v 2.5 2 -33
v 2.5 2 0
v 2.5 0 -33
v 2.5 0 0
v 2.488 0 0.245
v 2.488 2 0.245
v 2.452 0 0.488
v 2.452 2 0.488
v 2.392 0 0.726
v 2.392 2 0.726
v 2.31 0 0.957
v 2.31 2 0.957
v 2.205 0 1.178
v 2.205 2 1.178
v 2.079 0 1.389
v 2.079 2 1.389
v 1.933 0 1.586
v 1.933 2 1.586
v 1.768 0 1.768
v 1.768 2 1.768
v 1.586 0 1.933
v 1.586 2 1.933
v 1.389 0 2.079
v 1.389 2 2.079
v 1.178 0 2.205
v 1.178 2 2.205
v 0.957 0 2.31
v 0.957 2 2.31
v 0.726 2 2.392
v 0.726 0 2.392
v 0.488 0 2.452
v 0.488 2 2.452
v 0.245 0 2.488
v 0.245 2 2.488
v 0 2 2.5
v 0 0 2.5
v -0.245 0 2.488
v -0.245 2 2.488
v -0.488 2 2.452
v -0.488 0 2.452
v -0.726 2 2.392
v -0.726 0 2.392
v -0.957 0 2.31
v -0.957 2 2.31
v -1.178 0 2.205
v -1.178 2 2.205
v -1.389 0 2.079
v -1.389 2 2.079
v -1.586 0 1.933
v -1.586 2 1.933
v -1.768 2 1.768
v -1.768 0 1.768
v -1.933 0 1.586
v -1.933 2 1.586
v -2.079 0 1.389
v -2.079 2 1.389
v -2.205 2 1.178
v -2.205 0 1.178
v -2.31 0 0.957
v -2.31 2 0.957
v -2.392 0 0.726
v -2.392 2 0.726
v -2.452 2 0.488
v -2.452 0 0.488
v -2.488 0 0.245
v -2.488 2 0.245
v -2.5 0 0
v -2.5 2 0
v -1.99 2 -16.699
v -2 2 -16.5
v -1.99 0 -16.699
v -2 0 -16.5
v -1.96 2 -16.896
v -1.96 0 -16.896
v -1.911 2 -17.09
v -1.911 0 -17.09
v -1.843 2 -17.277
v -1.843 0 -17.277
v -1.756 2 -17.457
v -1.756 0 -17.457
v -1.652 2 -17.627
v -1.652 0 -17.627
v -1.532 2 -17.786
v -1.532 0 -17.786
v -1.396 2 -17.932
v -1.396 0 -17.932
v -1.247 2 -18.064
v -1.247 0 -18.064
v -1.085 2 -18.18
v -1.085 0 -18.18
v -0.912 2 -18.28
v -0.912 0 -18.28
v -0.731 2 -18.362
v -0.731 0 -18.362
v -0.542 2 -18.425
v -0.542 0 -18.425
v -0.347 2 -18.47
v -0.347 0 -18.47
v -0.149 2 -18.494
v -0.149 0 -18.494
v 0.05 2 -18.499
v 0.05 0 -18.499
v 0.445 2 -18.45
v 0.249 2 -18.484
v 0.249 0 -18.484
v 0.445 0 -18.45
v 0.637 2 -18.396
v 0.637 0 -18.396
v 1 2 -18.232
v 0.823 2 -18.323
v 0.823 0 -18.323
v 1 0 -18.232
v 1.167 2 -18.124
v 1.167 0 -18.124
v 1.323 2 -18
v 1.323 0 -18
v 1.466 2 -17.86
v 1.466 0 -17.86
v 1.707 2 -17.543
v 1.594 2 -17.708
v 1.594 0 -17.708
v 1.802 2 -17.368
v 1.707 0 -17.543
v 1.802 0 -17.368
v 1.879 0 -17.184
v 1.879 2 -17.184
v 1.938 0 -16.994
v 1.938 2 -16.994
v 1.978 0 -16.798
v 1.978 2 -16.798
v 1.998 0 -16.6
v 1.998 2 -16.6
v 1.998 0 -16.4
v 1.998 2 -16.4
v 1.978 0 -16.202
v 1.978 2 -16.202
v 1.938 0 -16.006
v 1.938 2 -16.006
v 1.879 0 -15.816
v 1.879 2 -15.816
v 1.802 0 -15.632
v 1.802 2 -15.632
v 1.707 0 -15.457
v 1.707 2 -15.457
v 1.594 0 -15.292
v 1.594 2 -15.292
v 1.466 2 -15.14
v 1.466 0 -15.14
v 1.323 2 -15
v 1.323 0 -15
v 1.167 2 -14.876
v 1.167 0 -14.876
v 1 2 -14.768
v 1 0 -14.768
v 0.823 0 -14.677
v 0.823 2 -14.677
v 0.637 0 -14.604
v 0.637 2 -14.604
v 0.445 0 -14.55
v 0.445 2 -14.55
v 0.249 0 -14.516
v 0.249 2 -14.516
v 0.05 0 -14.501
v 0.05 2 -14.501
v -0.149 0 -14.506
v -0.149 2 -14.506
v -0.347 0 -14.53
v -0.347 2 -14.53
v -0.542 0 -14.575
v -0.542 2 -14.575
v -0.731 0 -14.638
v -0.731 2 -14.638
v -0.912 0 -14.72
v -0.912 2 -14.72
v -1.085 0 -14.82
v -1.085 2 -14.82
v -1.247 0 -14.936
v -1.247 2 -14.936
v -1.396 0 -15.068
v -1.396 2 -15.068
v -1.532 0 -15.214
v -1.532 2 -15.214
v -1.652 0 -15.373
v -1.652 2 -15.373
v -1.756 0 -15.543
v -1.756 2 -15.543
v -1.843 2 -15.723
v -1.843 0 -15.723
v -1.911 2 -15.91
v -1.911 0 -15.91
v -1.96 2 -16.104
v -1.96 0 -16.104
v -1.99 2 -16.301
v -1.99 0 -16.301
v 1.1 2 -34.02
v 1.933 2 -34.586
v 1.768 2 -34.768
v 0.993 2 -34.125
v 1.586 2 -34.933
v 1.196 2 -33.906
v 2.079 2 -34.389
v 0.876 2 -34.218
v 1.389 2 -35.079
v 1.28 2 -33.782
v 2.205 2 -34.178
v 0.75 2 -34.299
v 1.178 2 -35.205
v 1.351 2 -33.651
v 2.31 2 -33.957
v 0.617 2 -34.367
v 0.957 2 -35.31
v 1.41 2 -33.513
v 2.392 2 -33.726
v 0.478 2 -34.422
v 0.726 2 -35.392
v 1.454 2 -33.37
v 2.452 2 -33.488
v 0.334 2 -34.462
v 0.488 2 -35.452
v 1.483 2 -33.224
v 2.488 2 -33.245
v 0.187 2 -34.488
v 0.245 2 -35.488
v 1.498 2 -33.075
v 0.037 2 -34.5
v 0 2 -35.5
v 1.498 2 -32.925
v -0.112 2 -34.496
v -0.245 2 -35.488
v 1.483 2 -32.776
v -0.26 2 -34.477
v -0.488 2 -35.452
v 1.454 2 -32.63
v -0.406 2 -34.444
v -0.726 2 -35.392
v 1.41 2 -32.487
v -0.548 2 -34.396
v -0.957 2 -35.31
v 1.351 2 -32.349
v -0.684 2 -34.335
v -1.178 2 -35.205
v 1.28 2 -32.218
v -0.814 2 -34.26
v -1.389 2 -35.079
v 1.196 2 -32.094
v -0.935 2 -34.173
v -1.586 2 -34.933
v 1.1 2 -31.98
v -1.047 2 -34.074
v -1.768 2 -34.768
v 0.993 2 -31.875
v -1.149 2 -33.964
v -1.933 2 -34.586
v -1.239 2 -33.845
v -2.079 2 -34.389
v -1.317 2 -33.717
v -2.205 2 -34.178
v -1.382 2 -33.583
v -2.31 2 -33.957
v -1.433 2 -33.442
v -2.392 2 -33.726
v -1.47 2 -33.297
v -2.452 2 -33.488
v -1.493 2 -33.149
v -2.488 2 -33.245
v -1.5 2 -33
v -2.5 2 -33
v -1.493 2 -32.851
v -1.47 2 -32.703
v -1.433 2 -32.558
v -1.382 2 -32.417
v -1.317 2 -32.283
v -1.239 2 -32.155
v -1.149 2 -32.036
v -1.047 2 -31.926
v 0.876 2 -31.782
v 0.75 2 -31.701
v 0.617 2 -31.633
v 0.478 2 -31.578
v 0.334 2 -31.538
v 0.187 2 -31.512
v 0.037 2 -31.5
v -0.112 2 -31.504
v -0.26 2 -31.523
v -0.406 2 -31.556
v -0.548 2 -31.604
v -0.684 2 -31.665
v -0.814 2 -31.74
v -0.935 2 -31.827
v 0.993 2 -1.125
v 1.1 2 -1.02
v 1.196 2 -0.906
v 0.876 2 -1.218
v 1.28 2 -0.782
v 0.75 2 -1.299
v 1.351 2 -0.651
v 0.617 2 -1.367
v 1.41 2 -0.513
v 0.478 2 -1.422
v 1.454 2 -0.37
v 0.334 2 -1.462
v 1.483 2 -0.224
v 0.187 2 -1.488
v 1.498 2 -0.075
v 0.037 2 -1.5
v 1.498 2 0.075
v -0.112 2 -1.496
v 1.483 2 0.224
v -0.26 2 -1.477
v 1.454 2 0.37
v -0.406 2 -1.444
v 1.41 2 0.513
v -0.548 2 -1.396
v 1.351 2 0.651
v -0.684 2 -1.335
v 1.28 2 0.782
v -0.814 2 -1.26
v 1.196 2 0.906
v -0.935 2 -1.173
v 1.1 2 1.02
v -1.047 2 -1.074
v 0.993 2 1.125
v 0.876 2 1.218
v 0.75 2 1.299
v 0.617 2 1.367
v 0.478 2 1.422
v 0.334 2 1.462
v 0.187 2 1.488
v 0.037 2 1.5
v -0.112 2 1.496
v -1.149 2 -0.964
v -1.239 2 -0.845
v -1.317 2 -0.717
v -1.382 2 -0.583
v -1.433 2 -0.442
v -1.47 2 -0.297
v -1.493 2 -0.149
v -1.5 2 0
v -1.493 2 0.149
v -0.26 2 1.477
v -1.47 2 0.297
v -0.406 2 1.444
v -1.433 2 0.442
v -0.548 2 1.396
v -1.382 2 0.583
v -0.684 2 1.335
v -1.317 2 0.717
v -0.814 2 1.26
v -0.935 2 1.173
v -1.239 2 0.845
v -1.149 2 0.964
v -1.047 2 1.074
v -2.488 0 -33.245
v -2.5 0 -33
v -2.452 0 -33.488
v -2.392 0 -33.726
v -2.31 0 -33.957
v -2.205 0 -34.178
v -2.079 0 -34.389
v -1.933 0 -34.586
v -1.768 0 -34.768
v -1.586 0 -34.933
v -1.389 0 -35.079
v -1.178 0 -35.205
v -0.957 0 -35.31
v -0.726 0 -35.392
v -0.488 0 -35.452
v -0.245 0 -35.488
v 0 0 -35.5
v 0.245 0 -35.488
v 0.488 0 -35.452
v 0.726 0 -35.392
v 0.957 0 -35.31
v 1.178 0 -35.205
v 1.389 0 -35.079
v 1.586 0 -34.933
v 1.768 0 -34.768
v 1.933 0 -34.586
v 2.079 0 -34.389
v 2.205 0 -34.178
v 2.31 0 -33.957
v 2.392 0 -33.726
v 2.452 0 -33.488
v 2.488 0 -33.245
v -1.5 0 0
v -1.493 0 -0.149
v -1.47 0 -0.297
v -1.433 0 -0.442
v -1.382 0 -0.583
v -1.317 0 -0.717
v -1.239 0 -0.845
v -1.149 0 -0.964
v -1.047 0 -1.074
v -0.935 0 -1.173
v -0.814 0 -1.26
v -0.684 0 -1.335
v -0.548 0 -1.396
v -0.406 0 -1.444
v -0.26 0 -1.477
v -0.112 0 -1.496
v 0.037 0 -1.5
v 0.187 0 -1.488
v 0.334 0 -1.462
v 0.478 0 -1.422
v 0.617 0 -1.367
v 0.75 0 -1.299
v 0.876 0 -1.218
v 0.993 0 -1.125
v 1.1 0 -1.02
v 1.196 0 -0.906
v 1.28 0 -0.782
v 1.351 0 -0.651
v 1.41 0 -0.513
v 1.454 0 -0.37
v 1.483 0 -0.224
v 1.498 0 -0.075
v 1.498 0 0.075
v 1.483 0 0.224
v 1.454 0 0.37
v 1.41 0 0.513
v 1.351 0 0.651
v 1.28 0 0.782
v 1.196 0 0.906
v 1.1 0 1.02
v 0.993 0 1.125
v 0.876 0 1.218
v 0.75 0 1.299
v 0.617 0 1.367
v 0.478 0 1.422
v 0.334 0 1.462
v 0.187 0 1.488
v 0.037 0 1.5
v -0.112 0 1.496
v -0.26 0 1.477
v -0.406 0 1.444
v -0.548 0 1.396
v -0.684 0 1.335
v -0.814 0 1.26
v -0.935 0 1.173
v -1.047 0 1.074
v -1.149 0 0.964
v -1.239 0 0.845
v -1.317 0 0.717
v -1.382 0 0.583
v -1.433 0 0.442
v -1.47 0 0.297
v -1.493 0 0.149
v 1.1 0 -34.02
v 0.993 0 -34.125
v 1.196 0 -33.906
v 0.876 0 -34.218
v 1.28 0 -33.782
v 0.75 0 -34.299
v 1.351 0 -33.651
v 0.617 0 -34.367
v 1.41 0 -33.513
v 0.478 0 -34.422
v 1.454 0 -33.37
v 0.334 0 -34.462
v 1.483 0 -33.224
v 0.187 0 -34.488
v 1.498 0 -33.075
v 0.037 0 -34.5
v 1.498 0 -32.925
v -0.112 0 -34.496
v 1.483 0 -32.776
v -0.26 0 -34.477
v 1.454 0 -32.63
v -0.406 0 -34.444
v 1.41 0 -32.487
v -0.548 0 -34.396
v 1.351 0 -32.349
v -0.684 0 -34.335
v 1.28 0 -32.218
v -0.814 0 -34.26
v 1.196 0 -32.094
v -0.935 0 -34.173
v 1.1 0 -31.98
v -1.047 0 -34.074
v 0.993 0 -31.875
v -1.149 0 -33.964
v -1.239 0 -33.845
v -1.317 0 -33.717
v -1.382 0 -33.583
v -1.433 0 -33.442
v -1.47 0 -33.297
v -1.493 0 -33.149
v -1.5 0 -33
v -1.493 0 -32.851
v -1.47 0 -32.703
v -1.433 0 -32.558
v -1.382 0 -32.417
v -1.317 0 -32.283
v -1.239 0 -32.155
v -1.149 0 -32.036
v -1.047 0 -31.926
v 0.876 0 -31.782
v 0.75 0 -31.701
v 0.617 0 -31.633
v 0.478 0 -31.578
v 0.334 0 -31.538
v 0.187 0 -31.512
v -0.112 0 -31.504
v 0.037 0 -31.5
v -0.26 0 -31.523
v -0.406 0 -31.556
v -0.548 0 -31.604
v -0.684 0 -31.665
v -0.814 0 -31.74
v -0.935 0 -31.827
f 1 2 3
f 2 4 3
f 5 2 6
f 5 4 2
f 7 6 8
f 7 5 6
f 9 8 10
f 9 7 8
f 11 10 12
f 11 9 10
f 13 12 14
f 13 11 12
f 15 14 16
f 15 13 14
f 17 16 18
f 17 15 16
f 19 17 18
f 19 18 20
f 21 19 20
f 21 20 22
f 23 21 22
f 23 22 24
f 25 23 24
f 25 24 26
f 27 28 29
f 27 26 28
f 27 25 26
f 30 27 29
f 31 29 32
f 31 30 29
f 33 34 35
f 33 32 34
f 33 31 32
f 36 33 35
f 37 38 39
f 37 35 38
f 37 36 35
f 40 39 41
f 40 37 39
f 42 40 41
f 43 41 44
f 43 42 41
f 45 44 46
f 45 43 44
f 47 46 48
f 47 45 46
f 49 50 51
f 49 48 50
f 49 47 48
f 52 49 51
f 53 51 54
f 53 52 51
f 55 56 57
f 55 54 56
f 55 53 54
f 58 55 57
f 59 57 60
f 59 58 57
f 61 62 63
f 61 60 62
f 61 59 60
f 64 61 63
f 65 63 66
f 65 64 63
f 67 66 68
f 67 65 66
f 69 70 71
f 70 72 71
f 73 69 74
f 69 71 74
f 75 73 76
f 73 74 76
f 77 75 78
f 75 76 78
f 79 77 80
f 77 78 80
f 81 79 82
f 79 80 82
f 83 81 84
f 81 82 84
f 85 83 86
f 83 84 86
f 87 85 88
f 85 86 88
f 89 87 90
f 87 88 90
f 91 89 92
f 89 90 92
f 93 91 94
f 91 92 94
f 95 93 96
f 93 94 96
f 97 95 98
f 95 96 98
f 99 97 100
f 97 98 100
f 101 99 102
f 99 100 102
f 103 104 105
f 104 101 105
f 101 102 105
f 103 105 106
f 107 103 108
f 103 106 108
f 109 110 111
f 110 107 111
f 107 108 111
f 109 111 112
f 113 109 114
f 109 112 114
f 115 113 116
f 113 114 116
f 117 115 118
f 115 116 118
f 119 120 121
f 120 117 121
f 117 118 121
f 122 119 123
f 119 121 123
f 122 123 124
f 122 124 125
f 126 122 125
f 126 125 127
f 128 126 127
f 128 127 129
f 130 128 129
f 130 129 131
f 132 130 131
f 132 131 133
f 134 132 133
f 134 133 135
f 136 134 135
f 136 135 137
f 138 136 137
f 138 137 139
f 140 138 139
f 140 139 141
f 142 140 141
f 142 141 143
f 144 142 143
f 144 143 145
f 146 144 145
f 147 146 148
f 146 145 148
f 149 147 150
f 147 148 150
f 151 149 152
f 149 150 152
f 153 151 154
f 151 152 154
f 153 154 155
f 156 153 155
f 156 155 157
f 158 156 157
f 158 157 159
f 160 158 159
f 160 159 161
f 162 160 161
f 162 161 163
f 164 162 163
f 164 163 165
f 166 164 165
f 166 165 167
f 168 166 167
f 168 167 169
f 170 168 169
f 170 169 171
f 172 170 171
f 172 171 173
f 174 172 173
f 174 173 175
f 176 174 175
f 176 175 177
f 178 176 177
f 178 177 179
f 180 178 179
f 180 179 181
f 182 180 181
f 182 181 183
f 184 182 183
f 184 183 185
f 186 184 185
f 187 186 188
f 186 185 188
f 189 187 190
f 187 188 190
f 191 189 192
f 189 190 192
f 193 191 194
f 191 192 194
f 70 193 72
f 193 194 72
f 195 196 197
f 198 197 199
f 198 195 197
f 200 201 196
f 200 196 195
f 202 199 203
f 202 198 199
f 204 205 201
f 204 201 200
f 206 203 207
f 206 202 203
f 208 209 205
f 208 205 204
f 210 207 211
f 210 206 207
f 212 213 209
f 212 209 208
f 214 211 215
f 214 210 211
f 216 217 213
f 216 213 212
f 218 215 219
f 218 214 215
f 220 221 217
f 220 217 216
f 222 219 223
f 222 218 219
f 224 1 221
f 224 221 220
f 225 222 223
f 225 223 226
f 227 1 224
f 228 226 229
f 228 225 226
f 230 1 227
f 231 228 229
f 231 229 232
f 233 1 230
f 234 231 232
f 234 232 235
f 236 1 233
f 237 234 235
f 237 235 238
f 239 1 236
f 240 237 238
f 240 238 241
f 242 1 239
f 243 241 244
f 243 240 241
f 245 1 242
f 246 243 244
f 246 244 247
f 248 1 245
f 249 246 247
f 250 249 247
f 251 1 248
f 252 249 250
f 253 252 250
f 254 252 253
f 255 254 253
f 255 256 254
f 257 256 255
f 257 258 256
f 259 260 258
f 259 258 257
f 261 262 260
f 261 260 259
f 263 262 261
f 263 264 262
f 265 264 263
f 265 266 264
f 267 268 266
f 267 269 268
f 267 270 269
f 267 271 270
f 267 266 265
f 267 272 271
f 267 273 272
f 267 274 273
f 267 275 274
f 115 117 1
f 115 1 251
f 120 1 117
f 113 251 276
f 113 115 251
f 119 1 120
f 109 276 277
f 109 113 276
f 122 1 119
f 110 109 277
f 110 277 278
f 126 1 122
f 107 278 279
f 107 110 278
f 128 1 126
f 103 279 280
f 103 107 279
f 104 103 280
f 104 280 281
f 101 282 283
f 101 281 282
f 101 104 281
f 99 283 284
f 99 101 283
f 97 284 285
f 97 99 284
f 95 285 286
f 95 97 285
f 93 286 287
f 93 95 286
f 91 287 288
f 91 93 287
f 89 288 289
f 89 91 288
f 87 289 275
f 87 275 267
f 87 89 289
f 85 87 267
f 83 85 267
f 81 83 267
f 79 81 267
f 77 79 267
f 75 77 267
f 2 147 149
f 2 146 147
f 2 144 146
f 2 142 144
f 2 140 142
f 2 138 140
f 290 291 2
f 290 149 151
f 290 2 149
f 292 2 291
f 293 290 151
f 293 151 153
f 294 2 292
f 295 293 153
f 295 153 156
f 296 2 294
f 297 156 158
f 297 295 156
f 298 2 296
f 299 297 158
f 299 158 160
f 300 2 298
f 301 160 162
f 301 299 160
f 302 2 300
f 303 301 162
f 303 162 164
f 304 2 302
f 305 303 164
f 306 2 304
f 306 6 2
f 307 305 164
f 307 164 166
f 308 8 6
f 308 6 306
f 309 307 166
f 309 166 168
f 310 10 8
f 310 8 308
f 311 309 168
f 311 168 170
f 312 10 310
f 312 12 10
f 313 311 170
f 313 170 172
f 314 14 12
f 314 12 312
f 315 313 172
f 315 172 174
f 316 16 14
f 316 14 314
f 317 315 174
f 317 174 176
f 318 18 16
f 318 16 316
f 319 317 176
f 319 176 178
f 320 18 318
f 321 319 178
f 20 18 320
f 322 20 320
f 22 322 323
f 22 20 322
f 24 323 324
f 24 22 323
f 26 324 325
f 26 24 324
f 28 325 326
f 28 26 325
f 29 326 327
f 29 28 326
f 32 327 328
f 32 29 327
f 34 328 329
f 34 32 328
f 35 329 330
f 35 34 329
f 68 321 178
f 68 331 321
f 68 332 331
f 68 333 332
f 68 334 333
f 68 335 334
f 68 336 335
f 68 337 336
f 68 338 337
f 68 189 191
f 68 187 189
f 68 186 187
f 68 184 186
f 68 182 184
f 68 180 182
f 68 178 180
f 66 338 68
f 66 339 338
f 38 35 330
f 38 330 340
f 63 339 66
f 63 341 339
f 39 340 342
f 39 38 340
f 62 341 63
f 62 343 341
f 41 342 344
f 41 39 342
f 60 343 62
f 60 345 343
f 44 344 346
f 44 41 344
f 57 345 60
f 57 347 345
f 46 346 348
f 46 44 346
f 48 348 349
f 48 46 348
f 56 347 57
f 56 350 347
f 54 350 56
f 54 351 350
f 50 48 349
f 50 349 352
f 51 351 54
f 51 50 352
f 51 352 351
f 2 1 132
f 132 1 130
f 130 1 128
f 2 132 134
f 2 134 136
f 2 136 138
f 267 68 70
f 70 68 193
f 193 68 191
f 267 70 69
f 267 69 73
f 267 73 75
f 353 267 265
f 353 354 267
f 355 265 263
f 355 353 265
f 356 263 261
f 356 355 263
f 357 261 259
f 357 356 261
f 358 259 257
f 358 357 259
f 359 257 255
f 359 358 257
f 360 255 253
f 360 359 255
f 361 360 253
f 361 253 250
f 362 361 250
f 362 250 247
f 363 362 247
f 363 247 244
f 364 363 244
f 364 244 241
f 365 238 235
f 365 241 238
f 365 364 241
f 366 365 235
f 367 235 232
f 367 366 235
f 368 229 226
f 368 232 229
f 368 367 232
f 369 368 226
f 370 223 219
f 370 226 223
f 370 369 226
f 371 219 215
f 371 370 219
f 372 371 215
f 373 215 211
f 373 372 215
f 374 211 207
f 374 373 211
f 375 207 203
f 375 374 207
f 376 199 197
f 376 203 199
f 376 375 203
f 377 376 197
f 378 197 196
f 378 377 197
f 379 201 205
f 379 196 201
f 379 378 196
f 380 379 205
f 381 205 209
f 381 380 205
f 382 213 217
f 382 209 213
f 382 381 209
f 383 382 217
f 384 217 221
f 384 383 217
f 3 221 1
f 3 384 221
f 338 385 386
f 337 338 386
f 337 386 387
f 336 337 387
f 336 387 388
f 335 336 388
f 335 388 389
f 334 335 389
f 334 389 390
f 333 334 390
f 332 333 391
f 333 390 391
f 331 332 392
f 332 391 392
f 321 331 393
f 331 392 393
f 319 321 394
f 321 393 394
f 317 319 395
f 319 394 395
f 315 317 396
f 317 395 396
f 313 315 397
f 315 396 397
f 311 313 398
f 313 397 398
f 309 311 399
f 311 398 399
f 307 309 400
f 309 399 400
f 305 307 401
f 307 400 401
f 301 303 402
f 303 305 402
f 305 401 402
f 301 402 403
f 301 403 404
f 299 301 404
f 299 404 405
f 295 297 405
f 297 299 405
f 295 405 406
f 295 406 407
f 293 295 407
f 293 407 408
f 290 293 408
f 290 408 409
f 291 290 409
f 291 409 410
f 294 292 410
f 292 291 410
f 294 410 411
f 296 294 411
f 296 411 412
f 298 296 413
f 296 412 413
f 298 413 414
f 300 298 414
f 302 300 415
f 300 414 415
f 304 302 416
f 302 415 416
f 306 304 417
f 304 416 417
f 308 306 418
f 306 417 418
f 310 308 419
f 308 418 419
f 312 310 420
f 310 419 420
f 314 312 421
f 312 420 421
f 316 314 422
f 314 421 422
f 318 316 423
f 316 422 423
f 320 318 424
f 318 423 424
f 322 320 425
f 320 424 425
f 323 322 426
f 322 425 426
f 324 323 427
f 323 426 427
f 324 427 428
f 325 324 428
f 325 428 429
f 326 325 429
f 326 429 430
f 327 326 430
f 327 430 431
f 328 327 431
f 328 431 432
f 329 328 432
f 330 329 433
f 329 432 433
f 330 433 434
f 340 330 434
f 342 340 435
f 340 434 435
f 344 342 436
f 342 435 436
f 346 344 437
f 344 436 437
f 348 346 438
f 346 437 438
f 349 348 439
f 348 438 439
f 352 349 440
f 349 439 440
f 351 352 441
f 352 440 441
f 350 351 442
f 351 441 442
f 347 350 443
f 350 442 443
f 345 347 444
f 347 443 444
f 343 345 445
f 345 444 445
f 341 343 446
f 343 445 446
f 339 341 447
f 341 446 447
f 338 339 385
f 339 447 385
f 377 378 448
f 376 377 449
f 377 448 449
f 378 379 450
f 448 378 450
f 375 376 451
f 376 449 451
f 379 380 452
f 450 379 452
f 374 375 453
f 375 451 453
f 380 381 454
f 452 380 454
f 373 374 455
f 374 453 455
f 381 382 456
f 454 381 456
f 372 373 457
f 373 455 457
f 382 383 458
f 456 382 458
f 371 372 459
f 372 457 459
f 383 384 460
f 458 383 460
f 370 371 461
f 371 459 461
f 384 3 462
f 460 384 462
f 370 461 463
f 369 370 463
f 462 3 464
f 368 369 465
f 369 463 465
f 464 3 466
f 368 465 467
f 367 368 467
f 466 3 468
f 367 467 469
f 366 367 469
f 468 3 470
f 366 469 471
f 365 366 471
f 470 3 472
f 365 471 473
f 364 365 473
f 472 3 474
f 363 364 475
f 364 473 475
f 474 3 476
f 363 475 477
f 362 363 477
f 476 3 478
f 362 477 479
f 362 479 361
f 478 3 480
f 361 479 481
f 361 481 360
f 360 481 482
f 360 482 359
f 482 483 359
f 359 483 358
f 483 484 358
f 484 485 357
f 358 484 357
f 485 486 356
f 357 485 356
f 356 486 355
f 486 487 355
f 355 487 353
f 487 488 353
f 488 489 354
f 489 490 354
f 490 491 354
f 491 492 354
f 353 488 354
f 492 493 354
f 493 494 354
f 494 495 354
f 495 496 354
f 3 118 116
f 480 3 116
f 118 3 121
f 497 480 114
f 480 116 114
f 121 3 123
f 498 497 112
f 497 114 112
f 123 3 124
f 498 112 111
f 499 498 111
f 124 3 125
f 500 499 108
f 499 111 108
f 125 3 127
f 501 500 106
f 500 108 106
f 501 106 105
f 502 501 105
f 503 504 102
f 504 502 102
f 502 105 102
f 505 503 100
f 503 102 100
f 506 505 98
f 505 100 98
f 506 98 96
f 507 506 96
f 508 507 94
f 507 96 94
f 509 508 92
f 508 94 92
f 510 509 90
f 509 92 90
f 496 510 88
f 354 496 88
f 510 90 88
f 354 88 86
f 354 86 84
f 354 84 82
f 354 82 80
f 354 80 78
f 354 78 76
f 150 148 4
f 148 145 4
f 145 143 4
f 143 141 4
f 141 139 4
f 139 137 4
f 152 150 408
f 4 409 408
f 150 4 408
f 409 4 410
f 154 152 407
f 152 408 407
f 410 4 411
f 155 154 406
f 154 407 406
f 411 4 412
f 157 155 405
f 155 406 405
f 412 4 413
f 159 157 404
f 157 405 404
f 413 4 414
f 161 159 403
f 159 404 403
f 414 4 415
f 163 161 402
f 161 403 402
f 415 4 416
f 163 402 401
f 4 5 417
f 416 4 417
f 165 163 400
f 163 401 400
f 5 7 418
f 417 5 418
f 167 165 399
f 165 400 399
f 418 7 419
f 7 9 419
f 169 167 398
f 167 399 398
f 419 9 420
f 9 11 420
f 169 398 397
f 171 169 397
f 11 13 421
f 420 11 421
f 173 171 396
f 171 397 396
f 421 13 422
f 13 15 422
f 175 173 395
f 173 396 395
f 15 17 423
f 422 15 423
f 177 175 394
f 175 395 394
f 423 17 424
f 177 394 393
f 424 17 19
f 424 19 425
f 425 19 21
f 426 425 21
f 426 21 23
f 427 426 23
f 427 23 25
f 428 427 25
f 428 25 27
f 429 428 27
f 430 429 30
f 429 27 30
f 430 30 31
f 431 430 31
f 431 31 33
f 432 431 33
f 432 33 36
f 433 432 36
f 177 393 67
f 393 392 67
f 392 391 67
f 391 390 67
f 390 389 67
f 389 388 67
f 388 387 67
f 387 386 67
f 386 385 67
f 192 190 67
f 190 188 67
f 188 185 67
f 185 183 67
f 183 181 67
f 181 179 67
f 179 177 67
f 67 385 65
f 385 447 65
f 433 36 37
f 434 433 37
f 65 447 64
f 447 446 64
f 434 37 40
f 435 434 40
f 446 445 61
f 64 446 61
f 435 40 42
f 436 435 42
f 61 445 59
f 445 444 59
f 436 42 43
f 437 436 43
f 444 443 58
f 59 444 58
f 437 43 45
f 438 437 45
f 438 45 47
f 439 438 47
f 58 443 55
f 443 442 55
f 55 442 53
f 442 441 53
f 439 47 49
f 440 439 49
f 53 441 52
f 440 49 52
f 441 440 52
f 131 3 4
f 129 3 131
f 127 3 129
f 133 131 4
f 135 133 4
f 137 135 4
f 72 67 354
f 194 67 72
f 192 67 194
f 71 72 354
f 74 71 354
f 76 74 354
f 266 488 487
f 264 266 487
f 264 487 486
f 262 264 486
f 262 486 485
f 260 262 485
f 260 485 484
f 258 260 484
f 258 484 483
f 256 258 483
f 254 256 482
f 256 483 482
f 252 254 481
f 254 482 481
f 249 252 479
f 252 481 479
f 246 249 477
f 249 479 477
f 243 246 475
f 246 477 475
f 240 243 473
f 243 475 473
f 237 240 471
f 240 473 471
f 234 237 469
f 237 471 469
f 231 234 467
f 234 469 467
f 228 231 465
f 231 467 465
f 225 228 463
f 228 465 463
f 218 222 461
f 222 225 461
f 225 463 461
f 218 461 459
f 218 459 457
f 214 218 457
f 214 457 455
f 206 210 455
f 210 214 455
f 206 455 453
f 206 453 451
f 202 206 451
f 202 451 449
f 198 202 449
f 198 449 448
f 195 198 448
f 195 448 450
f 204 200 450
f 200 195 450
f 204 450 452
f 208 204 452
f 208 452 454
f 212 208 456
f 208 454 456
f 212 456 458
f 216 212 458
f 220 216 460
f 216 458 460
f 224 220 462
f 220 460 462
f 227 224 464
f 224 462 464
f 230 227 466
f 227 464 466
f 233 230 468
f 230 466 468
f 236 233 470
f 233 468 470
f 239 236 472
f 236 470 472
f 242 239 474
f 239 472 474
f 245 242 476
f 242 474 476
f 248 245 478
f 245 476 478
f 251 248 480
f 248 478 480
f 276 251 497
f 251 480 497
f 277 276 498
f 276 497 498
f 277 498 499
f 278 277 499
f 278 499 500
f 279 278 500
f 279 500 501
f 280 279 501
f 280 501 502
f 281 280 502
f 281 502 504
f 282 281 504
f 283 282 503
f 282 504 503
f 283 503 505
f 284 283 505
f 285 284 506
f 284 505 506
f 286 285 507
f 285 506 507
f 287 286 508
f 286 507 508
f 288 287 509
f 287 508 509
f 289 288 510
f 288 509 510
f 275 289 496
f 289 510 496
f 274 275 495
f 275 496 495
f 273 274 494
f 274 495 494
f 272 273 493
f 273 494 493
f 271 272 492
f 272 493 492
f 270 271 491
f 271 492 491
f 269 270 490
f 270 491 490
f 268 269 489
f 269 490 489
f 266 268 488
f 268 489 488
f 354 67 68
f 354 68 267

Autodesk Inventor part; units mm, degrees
ref_plane "YZ Plane" through (0, 0, 0) normal (1, 0, 0) x (0, 1, 0)
ref_plane "XZ Plane" through (0, 0, 0) normal (0, 1, 0) x (-1, 0, 0)
ref_plane "XY Plane" through (0, 0, 0) normal (0, 0, 1) x (1, 0, 0)
sketch "Sketch1" plane through (0, 0, 0) normal (0, 1, 0) x (-1, 0, 0)
  arc A0 (2.5, 0) -> (-2.5, 0) centre (0, 0) ccw
  line L0 (2.5, 0) -> (2.5, -33)
  line L1 (-2.5, 0) -> (-2.5, -33)
  arc A1 (-2.5, -33) -> (2.5, -33) centre (0, -33) ccw
  circle A2 centre (0, -16.5) radius 2
  circle A3 centre (0, 0) radius 1.5
  circle A4 centre (0, -33) radius 1.5
  dimension "d11" = 5
  dimension "d12" = 33
  dimension "d13" = 33
  dimension "d14" = 5
  dimension "d15" = 4
  dimension "d16" = 3
  dimension "d17" = 3
extrude "Extrusion1" add sketch "Sketch1" along normal blind 2
properties part number "g_servo horn"
